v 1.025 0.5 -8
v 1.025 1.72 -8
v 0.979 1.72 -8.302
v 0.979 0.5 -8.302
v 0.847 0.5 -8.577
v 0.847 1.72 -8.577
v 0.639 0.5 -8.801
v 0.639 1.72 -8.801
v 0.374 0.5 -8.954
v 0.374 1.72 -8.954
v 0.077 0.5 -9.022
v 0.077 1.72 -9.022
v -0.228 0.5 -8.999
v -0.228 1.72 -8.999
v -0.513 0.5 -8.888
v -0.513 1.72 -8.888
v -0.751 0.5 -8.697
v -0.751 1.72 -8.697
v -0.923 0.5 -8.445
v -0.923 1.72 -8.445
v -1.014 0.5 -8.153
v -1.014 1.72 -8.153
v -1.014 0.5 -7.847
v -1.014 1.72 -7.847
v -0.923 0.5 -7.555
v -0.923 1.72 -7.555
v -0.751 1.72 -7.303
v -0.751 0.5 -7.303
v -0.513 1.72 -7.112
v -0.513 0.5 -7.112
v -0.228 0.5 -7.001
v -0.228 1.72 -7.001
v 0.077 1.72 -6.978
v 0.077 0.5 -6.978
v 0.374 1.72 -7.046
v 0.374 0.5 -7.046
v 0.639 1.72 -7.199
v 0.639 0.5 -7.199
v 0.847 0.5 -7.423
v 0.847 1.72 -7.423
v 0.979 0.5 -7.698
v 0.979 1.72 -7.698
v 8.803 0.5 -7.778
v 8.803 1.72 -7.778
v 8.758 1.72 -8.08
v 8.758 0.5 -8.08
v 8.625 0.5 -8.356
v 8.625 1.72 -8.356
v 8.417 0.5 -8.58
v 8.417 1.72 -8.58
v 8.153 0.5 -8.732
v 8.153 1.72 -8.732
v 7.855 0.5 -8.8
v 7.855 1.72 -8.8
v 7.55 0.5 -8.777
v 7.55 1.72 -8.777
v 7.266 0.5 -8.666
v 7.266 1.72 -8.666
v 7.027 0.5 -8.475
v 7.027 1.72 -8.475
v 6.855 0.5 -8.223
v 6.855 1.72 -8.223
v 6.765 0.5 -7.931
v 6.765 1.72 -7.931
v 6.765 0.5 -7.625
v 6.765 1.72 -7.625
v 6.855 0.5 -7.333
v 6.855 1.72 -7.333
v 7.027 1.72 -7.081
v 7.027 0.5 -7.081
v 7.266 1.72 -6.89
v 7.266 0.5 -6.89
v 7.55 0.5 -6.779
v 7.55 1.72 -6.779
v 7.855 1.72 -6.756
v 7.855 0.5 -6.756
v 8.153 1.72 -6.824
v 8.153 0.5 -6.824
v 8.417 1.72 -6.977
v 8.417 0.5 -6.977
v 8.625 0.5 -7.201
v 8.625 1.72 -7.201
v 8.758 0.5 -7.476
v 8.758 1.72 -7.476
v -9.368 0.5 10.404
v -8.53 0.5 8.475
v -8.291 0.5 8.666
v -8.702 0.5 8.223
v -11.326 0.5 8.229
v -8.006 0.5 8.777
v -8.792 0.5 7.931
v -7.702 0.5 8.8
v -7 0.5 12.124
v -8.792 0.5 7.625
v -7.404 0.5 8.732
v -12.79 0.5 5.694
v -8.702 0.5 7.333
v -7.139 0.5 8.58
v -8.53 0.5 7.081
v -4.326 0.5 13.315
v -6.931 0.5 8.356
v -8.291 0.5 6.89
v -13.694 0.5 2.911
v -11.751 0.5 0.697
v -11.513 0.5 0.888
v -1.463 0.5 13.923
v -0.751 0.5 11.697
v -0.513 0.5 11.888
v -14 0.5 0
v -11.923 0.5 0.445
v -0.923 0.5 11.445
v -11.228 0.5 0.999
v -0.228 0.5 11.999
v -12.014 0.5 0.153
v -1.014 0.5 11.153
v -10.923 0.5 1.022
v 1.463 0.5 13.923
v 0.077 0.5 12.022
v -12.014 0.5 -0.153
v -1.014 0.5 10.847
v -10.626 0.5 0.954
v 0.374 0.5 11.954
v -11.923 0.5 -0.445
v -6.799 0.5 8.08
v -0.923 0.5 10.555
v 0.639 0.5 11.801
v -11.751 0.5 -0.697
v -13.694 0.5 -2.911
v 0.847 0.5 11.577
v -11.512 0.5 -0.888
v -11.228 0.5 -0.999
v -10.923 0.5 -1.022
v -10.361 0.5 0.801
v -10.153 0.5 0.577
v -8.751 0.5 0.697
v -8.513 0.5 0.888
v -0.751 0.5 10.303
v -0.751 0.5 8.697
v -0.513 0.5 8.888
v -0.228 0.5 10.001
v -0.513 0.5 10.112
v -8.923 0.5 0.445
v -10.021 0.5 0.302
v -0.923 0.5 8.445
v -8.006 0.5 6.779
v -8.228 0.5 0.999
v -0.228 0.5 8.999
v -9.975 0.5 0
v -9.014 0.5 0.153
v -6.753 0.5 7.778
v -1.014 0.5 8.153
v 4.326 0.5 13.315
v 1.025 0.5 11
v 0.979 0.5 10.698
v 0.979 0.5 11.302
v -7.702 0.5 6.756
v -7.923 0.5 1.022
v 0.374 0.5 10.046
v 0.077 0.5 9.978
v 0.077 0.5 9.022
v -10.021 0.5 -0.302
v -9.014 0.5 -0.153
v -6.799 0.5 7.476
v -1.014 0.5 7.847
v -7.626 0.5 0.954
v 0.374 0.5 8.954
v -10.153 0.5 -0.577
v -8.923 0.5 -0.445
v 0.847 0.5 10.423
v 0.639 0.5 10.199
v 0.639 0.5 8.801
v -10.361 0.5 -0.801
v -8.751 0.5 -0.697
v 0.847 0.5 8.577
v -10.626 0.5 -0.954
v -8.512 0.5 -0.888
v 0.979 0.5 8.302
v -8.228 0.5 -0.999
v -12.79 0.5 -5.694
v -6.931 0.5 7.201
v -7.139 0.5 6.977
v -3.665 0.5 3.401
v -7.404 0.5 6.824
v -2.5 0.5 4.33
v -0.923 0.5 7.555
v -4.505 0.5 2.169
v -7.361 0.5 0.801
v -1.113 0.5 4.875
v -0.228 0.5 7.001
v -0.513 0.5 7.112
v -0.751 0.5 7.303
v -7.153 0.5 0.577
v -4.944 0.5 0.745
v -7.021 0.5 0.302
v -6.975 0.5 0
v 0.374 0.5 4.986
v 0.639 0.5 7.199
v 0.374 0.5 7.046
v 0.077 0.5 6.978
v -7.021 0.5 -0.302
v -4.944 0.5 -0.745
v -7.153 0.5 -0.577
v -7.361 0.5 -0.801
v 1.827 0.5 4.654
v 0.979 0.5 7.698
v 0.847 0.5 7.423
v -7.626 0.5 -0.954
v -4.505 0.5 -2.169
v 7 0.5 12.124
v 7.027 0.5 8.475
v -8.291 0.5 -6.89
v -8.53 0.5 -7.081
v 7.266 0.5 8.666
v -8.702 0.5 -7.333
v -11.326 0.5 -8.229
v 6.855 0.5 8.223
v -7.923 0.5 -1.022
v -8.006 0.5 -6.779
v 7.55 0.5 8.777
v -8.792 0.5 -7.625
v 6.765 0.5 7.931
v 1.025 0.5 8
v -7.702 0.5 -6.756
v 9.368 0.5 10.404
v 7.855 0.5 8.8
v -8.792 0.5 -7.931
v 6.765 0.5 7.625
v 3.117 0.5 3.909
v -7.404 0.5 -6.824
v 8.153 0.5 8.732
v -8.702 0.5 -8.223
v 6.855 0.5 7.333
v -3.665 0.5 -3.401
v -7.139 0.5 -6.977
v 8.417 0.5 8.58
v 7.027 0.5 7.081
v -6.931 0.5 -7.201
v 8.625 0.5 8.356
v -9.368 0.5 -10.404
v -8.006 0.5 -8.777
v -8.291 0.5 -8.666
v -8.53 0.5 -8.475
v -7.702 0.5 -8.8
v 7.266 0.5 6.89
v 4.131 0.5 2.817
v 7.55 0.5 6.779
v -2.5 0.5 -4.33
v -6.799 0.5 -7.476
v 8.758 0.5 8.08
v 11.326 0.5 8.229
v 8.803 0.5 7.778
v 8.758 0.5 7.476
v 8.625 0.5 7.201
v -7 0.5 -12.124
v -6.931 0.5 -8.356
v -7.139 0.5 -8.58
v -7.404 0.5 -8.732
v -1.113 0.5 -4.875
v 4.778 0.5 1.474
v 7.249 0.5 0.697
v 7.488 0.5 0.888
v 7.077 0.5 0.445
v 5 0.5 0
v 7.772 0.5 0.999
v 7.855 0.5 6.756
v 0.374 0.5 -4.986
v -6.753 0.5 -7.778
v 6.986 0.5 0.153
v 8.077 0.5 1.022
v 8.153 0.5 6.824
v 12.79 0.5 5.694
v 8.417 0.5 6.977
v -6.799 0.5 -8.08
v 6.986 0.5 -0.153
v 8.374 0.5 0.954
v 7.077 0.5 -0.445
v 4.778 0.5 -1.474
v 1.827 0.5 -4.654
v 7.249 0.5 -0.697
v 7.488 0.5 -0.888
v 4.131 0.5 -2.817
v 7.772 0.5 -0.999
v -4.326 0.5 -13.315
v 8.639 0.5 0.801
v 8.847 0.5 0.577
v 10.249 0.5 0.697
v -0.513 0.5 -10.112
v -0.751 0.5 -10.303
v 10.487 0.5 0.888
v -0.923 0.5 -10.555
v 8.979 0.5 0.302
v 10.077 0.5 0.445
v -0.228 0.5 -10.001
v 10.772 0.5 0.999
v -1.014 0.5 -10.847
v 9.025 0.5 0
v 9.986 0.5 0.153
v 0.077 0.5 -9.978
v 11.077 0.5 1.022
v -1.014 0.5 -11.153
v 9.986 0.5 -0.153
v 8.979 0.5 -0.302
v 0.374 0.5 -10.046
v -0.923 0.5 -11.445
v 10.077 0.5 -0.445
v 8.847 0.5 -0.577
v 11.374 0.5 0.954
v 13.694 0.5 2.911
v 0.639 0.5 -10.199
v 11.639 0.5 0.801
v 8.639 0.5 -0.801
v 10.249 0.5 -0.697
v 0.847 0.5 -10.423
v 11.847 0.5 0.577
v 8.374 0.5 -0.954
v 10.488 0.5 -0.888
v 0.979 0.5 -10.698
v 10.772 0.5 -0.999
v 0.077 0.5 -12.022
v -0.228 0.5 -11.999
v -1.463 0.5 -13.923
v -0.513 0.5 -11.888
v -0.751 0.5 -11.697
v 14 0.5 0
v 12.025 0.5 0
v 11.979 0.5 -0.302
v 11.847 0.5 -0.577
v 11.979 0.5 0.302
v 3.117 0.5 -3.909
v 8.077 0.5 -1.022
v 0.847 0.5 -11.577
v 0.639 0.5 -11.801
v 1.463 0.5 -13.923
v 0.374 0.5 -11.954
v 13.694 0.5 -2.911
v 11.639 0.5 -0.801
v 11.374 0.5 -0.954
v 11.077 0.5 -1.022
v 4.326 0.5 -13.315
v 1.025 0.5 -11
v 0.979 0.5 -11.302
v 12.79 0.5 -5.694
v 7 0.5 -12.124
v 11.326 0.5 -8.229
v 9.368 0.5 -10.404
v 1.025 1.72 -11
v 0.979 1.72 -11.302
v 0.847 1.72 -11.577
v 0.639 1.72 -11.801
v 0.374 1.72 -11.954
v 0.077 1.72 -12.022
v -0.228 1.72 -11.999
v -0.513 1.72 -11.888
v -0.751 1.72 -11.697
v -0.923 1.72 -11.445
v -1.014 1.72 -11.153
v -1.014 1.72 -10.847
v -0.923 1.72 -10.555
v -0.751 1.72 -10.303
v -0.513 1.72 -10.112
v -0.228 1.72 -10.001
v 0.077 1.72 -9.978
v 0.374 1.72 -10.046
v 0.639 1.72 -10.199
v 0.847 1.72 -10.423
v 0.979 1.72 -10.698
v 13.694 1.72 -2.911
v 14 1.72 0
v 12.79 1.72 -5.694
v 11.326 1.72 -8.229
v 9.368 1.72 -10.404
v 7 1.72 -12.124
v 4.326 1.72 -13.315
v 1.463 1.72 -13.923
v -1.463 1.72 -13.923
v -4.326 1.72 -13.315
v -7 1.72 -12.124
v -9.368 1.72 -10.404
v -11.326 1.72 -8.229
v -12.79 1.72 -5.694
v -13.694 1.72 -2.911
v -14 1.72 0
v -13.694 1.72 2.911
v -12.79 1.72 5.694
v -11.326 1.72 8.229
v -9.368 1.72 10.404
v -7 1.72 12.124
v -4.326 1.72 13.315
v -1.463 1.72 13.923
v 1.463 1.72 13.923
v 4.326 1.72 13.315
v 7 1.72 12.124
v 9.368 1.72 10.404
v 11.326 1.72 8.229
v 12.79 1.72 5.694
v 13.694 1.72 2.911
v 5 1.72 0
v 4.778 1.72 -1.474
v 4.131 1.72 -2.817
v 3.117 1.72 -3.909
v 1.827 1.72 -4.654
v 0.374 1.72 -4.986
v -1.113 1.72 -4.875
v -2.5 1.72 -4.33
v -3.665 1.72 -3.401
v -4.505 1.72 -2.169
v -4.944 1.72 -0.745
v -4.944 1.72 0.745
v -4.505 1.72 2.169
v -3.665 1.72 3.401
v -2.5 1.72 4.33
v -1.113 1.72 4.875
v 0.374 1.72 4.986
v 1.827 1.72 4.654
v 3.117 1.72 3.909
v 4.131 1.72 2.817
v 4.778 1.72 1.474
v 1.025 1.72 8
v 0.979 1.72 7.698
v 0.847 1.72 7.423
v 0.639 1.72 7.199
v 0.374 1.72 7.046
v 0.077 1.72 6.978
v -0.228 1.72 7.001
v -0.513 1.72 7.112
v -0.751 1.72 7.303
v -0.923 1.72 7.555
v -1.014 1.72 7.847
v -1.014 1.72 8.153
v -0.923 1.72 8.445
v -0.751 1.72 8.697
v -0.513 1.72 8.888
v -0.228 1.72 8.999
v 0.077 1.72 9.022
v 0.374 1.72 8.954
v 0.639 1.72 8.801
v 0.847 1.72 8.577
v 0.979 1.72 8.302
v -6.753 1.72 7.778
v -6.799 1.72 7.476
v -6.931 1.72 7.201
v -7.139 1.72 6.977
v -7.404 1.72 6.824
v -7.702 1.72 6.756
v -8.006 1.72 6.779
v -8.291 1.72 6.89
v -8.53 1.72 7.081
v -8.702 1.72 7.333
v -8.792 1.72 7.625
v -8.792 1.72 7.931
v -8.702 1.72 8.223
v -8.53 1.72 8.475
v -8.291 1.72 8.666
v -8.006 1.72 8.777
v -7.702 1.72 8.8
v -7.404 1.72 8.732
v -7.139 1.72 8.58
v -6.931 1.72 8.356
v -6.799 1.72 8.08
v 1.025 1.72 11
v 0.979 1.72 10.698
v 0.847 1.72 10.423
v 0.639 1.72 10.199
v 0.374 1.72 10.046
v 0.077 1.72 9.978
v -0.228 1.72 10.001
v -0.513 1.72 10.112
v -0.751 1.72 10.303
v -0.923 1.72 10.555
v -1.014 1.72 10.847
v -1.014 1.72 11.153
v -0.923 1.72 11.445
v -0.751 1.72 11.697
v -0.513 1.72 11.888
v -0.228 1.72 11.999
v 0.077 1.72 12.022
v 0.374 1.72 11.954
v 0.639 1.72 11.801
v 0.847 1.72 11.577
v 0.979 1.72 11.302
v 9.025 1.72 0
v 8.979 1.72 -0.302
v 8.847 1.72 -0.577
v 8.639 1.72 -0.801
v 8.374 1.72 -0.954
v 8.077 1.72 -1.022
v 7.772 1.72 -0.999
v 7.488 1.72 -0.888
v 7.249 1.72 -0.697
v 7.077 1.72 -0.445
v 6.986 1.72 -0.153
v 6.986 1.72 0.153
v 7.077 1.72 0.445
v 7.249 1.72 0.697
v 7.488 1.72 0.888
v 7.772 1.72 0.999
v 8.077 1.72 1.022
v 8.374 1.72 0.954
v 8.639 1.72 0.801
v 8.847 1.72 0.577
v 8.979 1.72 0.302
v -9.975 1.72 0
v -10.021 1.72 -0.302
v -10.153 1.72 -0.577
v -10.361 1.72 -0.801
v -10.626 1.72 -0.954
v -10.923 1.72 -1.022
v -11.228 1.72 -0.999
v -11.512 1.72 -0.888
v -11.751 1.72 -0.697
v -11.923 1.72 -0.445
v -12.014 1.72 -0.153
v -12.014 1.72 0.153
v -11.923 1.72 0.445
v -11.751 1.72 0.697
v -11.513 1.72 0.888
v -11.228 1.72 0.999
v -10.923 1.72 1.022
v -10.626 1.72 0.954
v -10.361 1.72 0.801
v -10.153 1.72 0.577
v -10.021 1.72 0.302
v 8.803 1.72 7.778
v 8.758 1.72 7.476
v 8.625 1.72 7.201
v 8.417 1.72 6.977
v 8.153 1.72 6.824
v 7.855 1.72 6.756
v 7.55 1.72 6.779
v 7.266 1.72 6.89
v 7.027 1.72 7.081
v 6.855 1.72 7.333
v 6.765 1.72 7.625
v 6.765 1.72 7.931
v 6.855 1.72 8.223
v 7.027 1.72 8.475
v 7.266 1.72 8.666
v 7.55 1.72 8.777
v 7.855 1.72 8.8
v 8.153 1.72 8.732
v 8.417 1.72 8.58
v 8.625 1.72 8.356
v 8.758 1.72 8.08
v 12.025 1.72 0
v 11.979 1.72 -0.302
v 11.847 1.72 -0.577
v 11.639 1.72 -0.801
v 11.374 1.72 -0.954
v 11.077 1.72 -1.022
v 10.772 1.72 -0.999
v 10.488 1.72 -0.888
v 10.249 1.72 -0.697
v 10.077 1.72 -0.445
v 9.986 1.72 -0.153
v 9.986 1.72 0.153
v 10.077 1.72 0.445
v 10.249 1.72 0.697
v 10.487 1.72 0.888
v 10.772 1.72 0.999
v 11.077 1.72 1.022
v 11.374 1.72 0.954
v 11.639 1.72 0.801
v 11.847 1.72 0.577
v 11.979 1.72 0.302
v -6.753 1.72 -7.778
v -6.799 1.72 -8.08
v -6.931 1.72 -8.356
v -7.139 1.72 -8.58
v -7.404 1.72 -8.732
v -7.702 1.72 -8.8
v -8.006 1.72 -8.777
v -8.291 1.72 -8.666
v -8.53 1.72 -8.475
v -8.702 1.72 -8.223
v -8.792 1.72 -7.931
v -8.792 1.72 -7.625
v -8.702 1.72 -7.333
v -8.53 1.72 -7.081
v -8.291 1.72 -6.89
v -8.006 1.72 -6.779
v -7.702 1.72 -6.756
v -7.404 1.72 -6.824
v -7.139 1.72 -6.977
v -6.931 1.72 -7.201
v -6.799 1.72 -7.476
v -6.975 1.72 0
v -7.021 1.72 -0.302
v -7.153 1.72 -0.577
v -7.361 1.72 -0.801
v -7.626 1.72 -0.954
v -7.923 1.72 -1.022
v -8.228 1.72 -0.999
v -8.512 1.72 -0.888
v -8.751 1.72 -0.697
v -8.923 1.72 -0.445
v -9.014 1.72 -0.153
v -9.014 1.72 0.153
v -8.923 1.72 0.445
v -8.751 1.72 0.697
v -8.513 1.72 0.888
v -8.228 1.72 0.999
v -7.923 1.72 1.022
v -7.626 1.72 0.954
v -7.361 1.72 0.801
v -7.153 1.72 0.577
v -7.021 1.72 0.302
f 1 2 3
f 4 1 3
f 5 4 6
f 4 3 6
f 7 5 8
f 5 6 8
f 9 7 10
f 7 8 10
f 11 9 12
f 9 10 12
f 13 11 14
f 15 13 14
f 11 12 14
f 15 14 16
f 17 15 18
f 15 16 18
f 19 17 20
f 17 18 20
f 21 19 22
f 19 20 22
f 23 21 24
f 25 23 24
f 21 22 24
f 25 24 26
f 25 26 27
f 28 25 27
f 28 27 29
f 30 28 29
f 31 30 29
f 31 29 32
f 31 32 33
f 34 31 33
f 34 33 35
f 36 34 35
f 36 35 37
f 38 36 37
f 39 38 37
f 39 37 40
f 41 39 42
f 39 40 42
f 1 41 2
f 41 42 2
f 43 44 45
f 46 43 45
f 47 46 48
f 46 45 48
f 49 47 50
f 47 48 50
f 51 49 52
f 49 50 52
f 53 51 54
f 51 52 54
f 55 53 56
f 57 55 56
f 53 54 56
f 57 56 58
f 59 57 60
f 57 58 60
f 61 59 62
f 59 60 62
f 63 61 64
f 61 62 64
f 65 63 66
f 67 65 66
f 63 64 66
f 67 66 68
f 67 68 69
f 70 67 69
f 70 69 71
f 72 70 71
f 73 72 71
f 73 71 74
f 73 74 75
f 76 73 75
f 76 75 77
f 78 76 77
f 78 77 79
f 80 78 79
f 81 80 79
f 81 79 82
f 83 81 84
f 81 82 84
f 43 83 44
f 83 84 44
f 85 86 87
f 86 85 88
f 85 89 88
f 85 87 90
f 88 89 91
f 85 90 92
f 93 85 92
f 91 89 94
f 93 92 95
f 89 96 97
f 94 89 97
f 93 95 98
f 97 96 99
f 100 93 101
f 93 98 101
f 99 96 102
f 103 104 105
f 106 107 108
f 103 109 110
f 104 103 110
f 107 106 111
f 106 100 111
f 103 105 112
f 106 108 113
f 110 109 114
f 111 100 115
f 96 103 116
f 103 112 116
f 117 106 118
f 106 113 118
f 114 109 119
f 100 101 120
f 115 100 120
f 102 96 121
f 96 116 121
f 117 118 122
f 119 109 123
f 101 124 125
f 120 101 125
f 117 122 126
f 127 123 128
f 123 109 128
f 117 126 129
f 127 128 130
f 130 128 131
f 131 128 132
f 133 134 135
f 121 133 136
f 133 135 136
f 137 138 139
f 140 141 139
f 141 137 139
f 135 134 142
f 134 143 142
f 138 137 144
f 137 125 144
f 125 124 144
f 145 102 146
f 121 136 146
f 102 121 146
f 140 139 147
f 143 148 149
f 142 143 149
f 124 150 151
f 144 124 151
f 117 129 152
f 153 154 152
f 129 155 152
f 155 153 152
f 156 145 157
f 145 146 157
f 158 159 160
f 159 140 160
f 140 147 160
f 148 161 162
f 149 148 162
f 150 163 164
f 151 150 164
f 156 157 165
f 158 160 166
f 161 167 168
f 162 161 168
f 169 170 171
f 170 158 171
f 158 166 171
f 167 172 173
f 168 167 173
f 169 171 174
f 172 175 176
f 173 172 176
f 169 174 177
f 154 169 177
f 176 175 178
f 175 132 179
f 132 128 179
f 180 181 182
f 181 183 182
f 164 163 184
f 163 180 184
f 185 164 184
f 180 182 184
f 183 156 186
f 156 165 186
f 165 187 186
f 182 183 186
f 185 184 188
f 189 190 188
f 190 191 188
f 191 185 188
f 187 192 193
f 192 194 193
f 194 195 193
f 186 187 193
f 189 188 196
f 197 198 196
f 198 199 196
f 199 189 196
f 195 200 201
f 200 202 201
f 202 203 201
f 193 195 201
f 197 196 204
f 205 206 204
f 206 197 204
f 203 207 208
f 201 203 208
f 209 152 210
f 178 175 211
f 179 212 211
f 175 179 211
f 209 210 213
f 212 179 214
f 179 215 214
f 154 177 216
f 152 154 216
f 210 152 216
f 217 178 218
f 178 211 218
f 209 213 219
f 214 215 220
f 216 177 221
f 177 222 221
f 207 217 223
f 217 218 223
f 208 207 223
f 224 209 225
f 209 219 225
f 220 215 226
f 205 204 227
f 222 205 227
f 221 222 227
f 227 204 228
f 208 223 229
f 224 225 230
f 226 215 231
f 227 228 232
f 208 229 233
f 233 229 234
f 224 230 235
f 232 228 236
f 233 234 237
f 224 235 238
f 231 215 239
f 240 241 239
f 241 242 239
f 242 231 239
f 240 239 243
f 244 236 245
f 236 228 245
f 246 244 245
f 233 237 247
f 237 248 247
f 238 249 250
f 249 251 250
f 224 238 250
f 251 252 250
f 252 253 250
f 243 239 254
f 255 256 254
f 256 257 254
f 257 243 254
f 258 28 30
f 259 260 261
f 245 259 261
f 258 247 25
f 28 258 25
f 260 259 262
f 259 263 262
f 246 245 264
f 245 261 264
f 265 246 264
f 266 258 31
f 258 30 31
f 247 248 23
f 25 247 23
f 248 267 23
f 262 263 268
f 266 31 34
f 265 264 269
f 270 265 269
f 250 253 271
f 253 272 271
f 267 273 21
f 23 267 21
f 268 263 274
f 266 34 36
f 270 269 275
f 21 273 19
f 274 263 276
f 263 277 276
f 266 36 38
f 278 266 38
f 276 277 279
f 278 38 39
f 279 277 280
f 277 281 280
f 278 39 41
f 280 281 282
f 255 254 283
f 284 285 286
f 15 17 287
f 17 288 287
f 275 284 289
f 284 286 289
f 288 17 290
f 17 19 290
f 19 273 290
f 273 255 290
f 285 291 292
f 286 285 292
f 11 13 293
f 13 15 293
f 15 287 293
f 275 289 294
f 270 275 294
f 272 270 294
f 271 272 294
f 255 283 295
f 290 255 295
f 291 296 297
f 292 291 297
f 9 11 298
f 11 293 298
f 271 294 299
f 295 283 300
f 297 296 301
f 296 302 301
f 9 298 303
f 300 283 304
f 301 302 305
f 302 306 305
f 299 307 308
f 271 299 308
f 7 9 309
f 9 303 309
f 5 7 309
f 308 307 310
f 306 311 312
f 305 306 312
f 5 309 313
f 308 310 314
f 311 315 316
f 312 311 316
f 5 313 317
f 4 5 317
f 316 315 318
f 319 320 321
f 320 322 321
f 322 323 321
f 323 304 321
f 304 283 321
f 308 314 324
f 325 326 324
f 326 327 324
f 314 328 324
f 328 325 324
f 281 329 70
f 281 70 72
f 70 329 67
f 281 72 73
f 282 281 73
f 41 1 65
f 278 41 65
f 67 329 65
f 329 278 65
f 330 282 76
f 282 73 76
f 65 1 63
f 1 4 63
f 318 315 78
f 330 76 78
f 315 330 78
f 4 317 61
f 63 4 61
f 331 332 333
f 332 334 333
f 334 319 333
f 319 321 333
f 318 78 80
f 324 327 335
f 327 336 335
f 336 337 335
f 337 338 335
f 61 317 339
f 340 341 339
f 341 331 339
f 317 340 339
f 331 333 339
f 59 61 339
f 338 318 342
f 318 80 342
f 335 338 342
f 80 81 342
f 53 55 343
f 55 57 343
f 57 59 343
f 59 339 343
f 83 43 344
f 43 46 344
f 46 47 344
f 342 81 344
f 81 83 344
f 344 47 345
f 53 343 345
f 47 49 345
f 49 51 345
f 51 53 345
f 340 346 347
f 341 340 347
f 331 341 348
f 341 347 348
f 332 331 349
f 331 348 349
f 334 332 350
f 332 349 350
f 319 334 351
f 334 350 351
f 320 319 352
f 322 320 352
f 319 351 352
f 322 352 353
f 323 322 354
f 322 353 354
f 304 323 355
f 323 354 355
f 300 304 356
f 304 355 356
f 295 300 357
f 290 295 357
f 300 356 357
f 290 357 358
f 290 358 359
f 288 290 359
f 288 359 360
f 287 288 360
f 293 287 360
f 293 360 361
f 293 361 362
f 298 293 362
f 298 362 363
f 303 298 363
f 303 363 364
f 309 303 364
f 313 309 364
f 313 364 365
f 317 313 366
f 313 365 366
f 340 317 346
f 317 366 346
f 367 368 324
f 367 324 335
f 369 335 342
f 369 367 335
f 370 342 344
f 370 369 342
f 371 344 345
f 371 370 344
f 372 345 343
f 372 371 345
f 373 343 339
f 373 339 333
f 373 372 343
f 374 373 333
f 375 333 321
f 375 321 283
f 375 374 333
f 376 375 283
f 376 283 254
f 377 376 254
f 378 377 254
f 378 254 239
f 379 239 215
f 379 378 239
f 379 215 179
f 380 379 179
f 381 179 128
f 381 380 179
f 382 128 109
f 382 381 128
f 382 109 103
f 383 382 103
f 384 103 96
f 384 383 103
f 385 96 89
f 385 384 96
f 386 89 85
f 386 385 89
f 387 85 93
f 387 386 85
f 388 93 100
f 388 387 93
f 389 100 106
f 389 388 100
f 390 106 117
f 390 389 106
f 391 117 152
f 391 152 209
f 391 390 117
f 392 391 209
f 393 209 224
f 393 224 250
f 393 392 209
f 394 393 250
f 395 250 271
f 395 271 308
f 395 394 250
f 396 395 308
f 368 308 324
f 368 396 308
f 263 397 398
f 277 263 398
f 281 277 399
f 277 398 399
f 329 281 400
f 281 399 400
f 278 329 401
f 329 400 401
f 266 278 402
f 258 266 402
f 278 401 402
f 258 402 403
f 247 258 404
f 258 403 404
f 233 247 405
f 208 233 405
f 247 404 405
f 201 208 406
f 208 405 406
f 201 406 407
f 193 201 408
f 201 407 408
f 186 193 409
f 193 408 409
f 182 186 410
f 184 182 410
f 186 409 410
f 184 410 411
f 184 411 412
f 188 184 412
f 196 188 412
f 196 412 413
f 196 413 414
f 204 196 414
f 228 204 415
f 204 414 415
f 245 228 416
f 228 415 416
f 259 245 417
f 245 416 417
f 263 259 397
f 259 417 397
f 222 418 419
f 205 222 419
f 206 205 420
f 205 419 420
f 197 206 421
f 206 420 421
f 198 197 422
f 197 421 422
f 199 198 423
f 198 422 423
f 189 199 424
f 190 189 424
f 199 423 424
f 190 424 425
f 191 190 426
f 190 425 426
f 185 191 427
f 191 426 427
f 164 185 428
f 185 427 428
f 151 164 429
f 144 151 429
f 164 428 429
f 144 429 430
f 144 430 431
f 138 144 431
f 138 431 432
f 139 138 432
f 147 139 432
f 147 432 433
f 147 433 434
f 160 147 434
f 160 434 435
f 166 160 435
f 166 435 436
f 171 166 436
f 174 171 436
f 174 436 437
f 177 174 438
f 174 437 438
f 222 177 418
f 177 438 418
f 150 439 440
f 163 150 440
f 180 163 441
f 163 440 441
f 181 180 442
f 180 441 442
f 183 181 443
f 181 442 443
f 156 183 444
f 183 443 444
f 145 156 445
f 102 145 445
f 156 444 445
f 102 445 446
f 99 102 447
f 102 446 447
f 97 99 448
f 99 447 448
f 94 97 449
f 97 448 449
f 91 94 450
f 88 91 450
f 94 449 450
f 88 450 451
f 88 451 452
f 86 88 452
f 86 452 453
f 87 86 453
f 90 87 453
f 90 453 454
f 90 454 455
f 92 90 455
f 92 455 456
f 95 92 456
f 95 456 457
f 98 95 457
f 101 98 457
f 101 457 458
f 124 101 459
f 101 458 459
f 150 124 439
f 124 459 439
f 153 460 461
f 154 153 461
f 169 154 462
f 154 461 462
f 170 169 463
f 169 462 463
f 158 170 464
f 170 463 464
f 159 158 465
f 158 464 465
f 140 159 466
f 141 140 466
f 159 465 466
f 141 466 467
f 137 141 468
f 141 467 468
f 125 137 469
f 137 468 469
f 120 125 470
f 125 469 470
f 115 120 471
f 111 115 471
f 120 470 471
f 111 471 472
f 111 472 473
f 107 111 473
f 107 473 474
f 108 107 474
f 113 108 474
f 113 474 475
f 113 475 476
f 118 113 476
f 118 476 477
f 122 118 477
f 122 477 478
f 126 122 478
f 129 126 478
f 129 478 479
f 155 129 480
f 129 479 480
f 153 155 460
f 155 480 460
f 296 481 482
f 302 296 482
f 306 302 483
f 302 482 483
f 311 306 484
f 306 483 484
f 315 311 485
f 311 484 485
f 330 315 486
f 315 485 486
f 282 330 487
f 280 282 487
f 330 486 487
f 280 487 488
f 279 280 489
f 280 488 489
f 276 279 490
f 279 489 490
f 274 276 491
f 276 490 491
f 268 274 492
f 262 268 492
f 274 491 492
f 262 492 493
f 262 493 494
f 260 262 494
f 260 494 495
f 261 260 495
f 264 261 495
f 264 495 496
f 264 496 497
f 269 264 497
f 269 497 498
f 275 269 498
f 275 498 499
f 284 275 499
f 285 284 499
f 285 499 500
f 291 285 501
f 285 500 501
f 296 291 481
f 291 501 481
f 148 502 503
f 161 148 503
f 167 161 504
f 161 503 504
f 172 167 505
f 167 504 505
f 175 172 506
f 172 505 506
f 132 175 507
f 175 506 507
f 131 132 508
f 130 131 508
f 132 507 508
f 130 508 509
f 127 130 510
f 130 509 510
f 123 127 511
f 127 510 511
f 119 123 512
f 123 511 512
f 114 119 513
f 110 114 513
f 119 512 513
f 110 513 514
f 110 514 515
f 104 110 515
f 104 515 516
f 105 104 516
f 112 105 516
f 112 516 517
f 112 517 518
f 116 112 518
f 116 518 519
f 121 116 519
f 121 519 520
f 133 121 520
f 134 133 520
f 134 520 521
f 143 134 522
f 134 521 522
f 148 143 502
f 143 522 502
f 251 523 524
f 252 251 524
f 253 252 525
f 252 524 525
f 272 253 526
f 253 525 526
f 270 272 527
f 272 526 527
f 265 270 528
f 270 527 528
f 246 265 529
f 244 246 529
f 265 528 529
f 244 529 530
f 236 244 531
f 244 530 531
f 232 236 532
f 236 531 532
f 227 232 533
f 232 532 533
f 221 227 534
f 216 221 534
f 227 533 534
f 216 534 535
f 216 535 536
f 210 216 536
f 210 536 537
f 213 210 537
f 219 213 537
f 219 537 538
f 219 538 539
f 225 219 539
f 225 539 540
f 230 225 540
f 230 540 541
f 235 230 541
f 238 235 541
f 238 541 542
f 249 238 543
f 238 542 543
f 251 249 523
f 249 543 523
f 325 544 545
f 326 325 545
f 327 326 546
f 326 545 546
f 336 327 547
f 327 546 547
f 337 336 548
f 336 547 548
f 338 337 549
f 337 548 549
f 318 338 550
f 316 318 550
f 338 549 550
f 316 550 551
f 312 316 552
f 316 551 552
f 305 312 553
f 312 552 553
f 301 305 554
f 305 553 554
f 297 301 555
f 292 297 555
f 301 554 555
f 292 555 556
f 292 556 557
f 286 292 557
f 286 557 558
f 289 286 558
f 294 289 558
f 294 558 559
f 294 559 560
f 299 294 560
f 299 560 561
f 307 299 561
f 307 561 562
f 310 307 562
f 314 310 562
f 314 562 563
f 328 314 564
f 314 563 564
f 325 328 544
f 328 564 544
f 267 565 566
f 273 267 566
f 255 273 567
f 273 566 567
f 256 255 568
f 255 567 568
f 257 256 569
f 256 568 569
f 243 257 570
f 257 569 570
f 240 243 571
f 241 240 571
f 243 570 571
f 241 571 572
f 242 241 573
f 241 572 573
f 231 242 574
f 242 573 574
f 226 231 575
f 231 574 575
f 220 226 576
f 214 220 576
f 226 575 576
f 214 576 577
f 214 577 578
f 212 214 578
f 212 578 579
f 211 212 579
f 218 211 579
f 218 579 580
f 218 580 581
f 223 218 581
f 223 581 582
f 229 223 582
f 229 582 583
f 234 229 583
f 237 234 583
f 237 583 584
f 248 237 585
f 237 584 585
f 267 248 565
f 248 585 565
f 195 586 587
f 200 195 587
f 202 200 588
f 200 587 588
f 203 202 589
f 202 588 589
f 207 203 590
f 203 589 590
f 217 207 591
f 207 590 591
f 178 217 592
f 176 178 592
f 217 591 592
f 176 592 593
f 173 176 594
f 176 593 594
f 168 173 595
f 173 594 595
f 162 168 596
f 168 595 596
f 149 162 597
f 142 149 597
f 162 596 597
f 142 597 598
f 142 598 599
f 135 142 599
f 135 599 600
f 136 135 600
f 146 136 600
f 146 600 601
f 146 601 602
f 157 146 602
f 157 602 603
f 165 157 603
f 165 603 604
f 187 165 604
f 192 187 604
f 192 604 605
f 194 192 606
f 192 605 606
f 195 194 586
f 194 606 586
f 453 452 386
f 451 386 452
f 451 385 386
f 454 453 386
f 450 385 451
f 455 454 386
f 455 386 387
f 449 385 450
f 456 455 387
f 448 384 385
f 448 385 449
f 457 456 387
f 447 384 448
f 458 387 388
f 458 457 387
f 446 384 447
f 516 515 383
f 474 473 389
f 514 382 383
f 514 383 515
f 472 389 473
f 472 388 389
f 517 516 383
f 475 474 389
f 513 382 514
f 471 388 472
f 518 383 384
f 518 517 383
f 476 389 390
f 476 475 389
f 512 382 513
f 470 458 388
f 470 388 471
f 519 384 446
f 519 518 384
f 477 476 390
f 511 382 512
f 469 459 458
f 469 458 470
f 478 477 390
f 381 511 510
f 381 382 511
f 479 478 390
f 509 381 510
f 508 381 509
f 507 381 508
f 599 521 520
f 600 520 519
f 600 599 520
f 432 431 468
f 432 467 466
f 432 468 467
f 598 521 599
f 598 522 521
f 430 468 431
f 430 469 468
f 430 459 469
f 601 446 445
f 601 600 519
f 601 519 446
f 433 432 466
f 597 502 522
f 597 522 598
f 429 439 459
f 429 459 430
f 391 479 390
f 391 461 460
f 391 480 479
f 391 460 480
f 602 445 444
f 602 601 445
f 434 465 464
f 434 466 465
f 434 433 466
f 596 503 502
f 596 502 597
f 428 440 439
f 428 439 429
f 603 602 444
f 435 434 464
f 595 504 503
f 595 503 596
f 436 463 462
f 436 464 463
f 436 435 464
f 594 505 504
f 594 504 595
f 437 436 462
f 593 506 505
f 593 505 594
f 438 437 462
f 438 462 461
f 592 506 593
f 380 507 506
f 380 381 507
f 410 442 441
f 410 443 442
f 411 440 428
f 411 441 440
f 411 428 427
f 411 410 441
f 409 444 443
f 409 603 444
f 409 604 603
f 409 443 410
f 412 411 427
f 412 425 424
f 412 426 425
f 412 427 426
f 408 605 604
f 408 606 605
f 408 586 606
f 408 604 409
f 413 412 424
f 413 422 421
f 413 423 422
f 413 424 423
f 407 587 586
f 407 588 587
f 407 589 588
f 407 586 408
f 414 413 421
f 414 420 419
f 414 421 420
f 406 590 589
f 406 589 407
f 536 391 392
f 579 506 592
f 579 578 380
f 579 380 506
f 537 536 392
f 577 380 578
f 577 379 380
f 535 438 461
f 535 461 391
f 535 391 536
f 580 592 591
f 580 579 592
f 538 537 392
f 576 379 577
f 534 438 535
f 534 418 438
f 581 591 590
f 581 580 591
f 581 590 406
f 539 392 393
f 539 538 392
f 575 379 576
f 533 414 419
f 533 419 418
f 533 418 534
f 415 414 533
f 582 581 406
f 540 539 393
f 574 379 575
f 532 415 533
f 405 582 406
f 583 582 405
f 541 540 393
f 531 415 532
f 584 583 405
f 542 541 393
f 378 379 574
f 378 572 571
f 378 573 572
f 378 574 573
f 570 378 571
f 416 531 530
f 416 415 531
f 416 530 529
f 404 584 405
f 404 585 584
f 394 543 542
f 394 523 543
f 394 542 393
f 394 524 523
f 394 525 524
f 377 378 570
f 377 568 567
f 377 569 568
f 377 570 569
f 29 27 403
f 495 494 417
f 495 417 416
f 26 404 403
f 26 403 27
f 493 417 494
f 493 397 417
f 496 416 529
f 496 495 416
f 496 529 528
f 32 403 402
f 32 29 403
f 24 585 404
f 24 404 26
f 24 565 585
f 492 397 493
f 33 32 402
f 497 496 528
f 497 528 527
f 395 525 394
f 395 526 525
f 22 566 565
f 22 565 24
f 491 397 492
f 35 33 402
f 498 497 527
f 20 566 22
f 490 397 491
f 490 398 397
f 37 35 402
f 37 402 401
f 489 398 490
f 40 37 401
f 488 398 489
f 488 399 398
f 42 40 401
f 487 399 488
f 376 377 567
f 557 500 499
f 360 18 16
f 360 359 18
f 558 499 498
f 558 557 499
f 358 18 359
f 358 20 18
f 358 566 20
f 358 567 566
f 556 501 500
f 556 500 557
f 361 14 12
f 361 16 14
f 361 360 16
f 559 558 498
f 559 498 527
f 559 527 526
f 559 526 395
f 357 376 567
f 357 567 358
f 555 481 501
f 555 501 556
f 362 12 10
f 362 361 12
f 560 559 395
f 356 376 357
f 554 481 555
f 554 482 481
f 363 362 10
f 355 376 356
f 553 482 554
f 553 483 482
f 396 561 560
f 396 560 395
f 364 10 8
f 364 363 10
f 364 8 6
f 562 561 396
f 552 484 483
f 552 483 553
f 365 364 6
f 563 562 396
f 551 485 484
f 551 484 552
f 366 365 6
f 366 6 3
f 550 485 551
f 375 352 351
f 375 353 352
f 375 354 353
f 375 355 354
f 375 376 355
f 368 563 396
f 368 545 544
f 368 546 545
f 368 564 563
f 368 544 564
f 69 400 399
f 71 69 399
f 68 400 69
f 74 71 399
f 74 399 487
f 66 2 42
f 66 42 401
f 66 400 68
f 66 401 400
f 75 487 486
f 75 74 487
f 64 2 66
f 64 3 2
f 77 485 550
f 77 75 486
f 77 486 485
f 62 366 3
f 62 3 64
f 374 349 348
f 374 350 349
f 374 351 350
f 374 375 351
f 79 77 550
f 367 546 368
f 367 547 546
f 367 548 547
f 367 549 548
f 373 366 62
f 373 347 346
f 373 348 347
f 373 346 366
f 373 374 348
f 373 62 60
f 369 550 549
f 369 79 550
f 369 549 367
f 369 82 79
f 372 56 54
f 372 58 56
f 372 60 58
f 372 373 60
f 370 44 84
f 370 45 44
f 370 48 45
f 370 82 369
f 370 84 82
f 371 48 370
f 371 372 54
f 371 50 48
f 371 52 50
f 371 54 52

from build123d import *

# Parameters (mm, degrees)
SKETCH1_R           = 14
SKETCH1_R_2         = 1.025
SKETCH1_R_3         = 5
BOSS_EXTRUDE1_DEPTH = 1.22


with BuildPart() as part:
    # Sketch1 → Boss-Extrude1 (new body)
    with BuildSketch(Plane(origin=(0, 1.72, 0), x_dir=(1, 0, 0), z_dir=(0, 1, 0))):
        Circle(SKETCH1_R)
        with Locations((-8, 0)):
            Circle(SKETCH1_R_2, mode=Mode.SUBTRACT)
        with Locations((8, 0)):
            Circle(SKETCH1_R_2, mode=Mode.SUBTRACT)
        with Locations((-7.778174593, 7.778174593)):
            Circle(SKETCH1_R_2, mode=Mode.SUBTRACT)
        with Locations((-7.778174593, -7.778174593)):
            Circle(SKETCH1_R_2, mode=Mode.SUBTRACT)
        with Locations((7.778174593, -7.778174593)):
            Circle(SKETCH1_R_2, mode=Mode.SUBTRACT)
        with Locations((7.778174593, 7.778174593)):
            Circle(SKETCH1_R_2, mode=Mode.SUBTRACT)
        with Locations((0, 11)):
            Circle(SKETCH1_R_2, mode=Mode.SUBTRACT)
        with Locations((11, 0)):
            Circle(SKETCH1_R_2, mode=Mode.SUBTRACT)
        with Locations((0, -11)):
            Circle(SKETCH1_R_2, mode=Mode.SUBTRACT)
        with Locations((-11, 0)):
            Circle(SKETCH1_R_2, mode=Mode.SUBTRACT)
        with Locations((0, 8)):
            Circle(SKETCH1_R_2, mode=Mode.SUBTRACT)
        with Locations((0, -8)):
            Circle(SKETCH1_R_2, mode=Mode.SUBTRACT)
        Circle(SKETCH1_R_3, mode=Mode.SUBTRACT)
    extrude(amount=-BOSS_EXTRUDE1_DEPTH)


solid = part.part
